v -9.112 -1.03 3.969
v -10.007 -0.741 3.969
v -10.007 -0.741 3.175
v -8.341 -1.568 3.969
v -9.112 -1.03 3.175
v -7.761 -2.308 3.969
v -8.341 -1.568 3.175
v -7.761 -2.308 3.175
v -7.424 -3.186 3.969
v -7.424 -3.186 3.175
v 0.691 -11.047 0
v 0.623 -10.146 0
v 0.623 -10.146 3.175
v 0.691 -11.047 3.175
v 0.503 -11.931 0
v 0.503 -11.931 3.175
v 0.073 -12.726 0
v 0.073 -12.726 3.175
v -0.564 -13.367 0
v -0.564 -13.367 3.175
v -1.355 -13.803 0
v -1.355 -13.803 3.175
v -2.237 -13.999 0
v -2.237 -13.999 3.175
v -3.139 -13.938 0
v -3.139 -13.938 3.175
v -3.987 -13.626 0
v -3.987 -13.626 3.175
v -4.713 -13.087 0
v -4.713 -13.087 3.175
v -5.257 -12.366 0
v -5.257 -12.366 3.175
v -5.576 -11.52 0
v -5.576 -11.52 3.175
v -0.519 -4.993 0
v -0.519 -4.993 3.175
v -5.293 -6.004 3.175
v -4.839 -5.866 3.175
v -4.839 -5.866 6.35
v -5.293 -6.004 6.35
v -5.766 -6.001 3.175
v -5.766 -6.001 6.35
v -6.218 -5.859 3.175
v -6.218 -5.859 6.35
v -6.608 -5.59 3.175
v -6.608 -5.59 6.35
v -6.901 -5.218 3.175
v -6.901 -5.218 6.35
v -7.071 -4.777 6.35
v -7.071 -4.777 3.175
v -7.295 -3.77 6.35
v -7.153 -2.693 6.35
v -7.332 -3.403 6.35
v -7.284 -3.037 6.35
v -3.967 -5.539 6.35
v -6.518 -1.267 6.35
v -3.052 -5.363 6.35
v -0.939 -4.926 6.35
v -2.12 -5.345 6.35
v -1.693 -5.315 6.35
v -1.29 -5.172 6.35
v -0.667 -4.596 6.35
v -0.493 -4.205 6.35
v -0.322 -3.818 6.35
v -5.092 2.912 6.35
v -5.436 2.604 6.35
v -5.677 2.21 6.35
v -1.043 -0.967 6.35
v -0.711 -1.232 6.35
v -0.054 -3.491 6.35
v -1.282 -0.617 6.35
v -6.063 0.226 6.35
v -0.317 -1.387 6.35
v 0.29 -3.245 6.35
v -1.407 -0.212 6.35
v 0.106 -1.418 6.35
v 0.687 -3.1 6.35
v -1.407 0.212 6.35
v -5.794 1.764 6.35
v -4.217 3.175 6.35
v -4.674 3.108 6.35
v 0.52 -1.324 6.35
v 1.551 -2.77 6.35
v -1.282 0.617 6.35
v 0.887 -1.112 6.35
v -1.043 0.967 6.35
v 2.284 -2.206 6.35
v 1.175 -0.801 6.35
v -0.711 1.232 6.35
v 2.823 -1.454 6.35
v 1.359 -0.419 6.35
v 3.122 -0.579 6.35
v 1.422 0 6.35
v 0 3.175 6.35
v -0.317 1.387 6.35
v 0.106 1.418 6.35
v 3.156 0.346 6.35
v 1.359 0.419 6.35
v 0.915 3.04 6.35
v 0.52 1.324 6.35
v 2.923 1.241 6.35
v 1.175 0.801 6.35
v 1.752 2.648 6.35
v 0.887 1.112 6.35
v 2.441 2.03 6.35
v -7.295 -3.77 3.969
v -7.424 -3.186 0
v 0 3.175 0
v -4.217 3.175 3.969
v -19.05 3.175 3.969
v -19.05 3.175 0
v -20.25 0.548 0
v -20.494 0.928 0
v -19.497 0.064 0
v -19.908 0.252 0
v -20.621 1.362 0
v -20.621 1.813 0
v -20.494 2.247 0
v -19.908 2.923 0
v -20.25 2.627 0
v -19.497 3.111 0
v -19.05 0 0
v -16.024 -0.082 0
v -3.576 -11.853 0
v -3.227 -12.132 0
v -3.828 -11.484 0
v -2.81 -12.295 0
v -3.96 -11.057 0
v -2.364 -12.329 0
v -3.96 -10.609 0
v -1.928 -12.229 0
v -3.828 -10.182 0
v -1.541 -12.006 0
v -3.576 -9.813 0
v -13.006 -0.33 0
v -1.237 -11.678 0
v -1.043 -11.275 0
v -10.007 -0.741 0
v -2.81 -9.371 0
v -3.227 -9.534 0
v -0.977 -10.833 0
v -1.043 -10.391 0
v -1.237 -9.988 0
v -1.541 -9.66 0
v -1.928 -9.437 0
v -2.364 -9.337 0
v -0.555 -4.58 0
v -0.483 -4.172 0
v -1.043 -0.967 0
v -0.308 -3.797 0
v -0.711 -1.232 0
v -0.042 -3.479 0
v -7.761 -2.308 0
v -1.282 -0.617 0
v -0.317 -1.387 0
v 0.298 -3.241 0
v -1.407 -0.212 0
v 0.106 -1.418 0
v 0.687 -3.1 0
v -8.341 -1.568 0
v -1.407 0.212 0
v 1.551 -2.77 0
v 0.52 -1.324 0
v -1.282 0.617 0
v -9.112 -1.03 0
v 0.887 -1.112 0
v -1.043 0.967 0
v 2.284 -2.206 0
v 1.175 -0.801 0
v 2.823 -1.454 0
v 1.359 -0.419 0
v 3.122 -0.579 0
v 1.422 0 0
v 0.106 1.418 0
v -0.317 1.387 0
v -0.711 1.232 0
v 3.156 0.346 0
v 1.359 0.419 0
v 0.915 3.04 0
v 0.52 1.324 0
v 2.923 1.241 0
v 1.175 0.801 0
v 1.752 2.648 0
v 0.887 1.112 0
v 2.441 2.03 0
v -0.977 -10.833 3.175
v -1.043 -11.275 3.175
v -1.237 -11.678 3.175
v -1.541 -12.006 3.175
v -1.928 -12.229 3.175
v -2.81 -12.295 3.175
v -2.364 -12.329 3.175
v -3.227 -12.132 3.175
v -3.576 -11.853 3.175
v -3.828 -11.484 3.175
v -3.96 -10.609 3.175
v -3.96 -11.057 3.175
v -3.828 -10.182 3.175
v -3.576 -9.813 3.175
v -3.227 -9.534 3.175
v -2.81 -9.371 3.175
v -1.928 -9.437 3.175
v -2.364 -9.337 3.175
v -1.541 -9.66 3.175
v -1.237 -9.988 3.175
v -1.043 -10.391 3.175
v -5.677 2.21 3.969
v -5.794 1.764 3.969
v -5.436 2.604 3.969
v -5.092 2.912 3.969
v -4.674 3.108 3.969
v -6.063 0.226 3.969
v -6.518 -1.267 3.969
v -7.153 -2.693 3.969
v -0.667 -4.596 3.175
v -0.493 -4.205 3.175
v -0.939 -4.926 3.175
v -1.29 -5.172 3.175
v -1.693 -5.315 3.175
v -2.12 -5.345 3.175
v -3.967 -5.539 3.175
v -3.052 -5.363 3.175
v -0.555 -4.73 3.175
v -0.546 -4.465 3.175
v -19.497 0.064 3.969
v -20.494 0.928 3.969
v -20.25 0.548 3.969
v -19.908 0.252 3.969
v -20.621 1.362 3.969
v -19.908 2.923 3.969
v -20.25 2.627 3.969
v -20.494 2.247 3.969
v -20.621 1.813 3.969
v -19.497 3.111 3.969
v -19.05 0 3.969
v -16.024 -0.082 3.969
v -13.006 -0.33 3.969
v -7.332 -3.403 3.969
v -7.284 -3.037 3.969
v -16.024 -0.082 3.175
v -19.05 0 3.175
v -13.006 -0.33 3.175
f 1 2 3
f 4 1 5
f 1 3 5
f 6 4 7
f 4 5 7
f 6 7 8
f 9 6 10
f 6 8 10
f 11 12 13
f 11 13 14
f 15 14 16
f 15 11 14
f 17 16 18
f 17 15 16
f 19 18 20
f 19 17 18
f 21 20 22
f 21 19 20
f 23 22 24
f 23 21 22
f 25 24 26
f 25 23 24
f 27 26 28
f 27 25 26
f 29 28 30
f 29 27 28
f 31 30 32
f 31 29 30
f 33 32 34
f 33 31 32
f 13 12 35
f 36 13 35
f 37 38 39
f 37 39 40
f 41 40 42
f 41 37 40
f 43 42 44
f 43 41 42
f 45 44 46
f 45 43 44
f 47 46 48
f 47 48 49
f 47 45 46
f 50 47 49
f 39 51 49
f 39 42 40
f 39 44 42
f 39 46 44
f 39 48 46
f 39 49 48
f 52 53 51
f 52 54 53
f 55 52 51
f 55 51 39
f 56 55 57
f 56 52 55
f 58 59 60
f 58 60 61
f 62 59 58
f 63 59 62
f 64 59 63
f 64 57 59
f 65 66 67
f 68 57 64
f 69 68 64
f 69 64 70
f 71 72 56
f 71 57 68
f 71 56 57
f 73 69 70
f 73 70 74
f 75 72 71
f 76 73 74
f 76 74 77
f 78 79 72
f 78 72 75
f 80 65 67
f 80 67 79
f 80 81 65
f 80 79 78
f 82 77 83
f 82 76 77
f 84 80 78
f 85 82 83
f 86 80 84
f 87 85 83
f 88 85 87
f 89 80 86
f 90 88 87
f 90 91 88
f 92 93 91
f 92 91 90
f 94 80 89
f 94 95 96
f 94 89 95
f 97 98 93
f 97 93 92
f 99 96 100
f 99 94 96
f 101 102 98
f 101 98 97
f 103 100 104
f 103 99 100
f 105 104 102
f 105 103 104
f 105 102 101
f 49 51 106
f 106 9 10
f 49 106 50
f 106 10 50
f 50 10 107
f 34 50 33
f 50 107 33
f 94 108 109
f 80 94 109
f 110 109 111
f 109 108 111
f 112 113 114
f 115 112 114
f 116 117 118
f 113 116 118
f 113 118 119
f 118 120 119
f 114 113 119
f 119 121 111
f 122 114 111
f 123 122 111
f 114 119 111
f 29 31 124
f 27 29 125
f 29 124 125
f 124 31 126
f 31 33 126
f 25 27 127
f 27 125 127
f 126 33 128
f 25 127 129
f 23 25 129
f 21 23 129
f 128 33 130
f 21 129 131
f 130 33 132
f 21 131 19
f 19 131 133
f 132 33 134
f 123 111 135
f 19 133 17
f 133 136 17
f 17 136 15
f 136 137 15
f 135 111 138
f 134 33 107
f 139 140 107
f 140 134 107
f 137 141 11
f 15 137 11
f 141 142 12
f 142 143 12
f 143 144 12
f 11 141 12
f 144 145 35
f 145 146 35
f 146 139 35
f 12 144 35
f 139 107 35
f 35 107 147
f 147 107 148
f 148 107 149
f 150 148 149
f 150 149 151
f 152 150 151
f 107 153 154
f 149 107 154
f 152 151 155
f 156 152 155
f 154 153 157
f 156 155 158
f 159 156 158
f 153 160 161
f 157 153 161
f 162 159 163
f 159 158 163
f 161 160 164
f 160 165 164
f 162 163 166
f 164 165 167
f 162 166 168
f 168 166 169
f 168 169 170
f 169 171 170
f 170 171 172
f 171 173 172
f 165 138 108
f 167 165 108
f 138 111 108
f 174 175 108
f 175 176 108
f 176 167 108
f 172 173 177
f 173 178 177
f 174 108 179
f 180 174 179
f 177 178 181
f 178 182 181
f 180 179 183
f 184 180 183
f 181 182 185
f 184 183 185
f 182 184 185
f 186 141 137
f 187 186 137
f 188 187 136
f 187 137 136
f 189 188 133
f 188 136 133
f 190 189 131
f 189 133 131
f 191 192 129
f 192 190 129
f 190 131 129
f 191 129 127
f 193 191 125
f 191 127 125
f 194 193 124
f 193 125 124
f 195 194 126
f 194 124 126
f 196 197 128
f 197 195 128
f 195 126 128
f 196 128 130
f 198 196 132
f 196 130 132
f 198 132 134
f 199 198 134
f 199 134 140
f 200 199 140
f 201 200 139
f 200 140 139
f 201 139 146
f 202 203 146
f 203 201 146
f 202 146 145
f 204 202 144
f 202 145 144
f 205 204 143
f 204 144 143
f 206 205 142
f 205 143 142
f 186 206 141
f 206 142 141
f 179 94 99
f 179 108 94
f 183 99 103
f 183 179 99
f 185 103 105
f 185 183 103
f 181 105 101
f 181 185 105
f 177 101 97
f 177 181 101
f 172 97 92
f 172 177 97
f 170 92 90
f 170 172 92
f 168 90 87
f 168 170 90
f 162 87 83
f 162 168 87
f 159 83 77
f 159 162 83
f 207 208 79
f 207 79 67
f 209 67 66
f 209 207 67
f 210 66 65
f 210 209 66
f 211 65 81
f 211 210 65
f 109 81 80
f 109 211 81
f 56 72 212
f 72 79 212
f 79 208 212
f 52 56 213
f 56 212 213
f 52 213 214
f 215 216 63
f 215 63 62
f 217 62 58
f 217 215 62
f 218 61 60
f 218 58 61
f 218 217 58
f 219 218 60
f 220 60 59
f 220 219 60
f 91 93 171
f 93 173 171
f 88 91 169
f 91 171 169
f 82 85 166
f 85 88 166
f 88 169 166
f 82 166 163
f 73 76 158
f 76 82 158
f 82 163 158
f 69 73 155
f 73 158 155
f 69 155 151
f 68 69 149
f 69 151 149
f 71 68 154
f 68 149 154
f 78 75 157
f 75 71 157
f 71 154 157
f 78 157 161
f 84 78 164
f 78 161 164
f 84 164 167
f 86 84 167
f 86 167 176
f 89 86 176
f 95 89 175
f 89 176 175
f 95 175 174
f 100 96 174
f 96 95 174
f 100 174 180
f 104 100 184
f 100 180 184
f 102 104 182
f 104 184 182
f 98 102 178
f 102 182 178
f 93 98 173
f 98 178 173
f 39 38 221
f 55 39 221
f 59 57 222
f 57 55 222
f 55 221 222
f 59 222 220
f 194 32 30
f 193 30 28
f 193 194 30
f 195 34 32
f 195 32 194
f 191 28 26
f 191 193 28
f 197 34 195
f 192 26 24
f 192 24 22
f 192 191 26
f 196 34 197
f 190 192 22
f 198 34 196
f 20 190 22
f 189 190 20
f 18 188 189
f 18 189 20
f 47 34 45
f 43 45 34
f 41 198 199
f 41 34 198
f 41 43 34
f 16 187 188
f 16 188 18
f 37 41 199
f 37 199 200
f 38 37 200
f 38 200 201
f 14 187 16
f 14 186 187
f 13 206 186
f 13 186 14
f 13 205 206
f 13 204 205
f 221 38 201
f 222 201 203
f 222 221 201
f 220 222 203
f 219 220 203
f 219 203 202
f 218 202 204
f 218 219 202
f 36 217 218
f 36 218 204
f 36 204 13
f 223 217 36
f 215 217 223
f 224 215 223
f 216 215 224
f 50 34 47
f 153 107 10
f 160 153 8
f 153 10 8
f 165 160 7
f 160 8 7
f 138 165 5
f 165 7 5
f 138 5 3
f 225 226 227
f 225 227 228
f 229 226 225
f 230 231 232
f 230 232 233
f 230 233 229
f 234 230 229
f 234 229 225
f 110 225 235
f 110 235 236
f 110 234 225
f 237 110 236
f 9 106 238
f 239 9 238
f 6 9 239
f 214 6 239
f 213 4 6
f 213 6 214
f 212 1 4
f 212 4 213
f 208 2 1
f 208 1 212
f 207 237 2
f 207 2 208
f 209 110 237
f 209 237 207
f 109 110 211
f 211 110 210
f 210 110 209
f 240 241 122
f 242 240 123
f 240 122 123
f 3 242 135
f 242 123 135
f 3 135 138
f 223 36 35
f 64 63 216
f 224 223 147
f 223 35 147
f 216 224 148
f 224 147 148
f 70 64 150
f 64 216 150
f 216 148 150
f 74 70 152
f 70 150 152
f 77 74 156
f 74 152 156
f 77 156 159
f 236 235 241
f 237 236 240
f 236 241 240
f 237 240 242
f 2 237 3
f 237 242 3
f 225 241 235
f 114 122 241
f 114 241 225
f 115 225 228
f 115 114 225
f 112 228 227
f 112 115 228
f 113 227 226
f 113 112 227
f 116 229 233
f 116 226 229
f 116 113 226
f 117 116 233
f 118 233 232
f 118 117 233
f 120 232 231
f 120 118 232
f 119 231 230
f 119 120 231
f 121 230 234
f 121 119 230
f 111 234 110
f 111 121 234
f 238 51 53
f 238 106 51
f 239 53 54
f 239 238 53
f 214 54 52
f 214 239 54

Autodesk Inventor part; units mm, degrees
ref_plane "YZ Plane" through (0, 0, 0) normal (1, 0, 0) x (0, 1, 0)
ref_plane "XZ Plane" through (0, 0, 0) normal (0, 1, 0) x (-1, 0, 0)
ref_plane "XY Plane" through (0, 0, 0) normal (0, 0, 1) x (1, 0, 0)
sketch "Sketch1" plane through (0, 0, 0) normal (0, 0, 1) x (1, 0, 0)
  circle A0 centre (0, 0) radius 1.4224
  circle A1 centre (0, 0) radius 3.175
  line L0 (0, 0) -> (-19.05, 0) construction
  circle A2 centre (-2.476506, -10.833032) radius 3.175
  circle A3 centre (-2.476506, -10.833032) radius 5 construction
  circle A4 centre (-2.476506, -10.833032) radius 1.5
  line L1 (0, 0) -> (-2.476506, -10.833032) construction
  line L2 (-2.476506, -10.833032) -> (-3.938782, -10.498745) construction
  line L3 (0, 0) -> (-2.476506, -10.833032) construction
  arc A5 (-5.54332, -10.011281) -> (0.590309, -11.654782) centre (-2.476506, -10.833032) ccw
  arc A6 (-1.02973, -3.003378) -> (-19.05, 0) centre (-19.05, -55.5625) ccw
  arc A7 (-19.05, 3.175) -> (-19.05, 0) centre (-19.05, 1.5875) ccw
  line L4 (-19.05, 3.175) -> (0, 3.175)
  line L5 (-2.476506, -10.833032) -> (-4.878131, 0) construction
  line L6 (0.623234, -10.145836) -> (-1.778391, 0.687196)
  line L7 (-7.977871, -0.687196) -> (-5.576246, -11.520227)
  arc A8 (-5.576246, -11.520227) -> (0.623234, -10.145836) centre (-2.476506, -10.833032) ccw
  arc A9 (-1.778391, 0.687196) -> (-7.977871, -0.687196) centre (-4.878131, 0) ccw
  circle A10 centre (6.746875, -0.79375) radius 3.175
  circle A11 centre (6.746875, -0.79375) radius 1.5
  line L8 (7.117846, 2.359503) -> (0.370971, 3.153253)
  arc A12 (4.720646, -3.238136) -> (-0.236744, -6.266728) centre (2.761054, -5.602132) ccw
  circle A13 centre (6.746875, -0.79375) radius 5 construction
  point P0 (0.590309, -11.654782)
  point P1 (0, 3.175)
  point P2 (-7.878677, -1.134631)
  point P3 (-5.576246, -11.520227)
  point P4 (0.623234, -10.145836)
  point P5 (-0.954741, -3.028051)
  point P6 (-2.439066, 2.03263)
  point P7 (1.235308, -2.924832)
  point P8 (1.403608, -2.847896)
  point P9 (-1.424341, -1.064207)
  point P10 (-1.702423, 0.512874)
  point P11 (0.623234, -10.145836)
  point P12 (-5.576246, -11.520227)
  dimension "d24" = 3
  dimension "d0" = 2.8448
  dimension "d1" = 6.35
  dimension "d9" = 19.05
  dimension "d22" = 6.35
  dimension "d23" = 10
  dimension "d26" = 11.1125
  dimension "d29" = 3.175
  dimension "d30" = 6.35
  dimension "d31" = 6.35
  dimension "d32" = 3
  dimension "d36" = 10
  dimension "d37" = 102.5
  dimension "d38" = 4.7625
  dimension "d39" = 6.74688
  dimension "d40" = 0.79375
sketch "Sketch1 outline for Extrusion1" plane through (0, 0, 0) normal (0, 0, 1) x (1, 0, 0)
  arc A0 (-19.05, 3.175) -> (-19.05, 0) centre (-19.05, 1.5875) ccw
  arc A1 (-19.05, 0) -> (-7.878677, -1.134631) centre (-19.05, -55.5625) cw
  line L0 (-7.878677, -1.134631) -> (-5.576246, -11.520227)
  arc A2 (-5.576246, -11.520227) -> (0.623234, -10.145836) centre (-2.476506, -10.833032) ccw
  line L1 (0.623234, -10.145836) -> (-0.954741, -3.028051)
  arc A3 (-0.954741, -3.028051) -> (0, 3.175) centre (0, 0) ccw
  line L2 (0, 3.175) -> (-19.05, 3.175)
  circle A4 centre (0, 0) radius 1.4224
  circle A5 centre (-2.476506, -10.833032) radius 1.5
extrude "Extrusion1" add sketch "Sketch1 outline for Extrusion1" along normal blind 3.175
fillet "Fillet1" radius 3.175 1 edges at (-7.8787, -1.1346, 1.5875)
sketch "Sketch2" plane through (0, 0, 3.175) normal (0, 0, 1) x (1, 0, 0)
  circle A0 centre (-2.476506, -10.833032) radius 1.5
  arc A1 (-0.348803, -5.761259) -> (-6.548283, -7.13565) centre (-2.476506, -10.833032) ccw
  line L0 (0, 3.175) -> (-19.05, 3.175)
  arc A2 (-19.05, 3.175) -> (-19.05, 0) centre (-19.05, 1.5875) ccw
  arc A3 (-10.006813, -0.74086) -> (-19.05, 0) centre (-19.05, -55.5625) ccw
  arc A4 (-7.423826, -3.18633) -> (-10.006813, -0.74086) centre (-10.523566, -3.873526) ccw
  line L1 (-7.423826, -3.18633) -> (-5.576246, -11.520227)
  arc A5 (-5.576246, -11.520227) -> (0.623234, -10.145836) centre (-2.476506, -10.833032) ccw
  line L2 (0.623234, -10.145836) -> (-0.954741, -3.028051)
  arc A6 (-0.954741, -3.028051) -> (0, 3.175) centre (0, 0) ccw
  circle A7 centre (0, 0) radius 1.4224
  circle A8 centre (-2.476506, -10.833032) radius 1.5
  arc A9 (-7.423826, -3.18633) -> (-10.006813, -0.74086) centre (-10.523566, -3.873526) ccw
  line L3 (0, 3.175) -> (-19.05, 3.175)
  arc A10 (-7.423826, -3.18633) -> (-5.7158, 3.175) centre (-18.4158, 3.175) ccw
  line L4 (0.623234, -10.145836) -> (-0.954741, -3.028051)
  line L5 (-7.423826, -3.18633) -> (-5.576246, -11.520227)
  point P0 (-6.548283, -7.13565)
  point P1 (-5.7158, 3.175)
  point P2 (-0.348803, -5.761259)
  dimension "d41" = 11
  dimension "d42" = 12.7
extrude "Extrusion2" add sketch "Sketch2" along normal blind 0.79375 contours A1 L1 A10 L0 A6 L2 | A4 A3 A2 L0 A10
extrude "Extrusion3" add sketch "Sketch2" along normal blind 3.175 contours A1 L1 A10 L0 A6 L2
fillet "Fillet2" radius 1.5875 5 edges at (-6.5483, -7.1357, 4.7625) (-7.4238, -3.1863, 5.1594) (-5.7158, 3.175, 5.1594) (-0.9547, -3.0281, 3.175) (-0.3488, -5.7613, 4.7625)
properties part number "Lever" material "Aluminum 6061"
